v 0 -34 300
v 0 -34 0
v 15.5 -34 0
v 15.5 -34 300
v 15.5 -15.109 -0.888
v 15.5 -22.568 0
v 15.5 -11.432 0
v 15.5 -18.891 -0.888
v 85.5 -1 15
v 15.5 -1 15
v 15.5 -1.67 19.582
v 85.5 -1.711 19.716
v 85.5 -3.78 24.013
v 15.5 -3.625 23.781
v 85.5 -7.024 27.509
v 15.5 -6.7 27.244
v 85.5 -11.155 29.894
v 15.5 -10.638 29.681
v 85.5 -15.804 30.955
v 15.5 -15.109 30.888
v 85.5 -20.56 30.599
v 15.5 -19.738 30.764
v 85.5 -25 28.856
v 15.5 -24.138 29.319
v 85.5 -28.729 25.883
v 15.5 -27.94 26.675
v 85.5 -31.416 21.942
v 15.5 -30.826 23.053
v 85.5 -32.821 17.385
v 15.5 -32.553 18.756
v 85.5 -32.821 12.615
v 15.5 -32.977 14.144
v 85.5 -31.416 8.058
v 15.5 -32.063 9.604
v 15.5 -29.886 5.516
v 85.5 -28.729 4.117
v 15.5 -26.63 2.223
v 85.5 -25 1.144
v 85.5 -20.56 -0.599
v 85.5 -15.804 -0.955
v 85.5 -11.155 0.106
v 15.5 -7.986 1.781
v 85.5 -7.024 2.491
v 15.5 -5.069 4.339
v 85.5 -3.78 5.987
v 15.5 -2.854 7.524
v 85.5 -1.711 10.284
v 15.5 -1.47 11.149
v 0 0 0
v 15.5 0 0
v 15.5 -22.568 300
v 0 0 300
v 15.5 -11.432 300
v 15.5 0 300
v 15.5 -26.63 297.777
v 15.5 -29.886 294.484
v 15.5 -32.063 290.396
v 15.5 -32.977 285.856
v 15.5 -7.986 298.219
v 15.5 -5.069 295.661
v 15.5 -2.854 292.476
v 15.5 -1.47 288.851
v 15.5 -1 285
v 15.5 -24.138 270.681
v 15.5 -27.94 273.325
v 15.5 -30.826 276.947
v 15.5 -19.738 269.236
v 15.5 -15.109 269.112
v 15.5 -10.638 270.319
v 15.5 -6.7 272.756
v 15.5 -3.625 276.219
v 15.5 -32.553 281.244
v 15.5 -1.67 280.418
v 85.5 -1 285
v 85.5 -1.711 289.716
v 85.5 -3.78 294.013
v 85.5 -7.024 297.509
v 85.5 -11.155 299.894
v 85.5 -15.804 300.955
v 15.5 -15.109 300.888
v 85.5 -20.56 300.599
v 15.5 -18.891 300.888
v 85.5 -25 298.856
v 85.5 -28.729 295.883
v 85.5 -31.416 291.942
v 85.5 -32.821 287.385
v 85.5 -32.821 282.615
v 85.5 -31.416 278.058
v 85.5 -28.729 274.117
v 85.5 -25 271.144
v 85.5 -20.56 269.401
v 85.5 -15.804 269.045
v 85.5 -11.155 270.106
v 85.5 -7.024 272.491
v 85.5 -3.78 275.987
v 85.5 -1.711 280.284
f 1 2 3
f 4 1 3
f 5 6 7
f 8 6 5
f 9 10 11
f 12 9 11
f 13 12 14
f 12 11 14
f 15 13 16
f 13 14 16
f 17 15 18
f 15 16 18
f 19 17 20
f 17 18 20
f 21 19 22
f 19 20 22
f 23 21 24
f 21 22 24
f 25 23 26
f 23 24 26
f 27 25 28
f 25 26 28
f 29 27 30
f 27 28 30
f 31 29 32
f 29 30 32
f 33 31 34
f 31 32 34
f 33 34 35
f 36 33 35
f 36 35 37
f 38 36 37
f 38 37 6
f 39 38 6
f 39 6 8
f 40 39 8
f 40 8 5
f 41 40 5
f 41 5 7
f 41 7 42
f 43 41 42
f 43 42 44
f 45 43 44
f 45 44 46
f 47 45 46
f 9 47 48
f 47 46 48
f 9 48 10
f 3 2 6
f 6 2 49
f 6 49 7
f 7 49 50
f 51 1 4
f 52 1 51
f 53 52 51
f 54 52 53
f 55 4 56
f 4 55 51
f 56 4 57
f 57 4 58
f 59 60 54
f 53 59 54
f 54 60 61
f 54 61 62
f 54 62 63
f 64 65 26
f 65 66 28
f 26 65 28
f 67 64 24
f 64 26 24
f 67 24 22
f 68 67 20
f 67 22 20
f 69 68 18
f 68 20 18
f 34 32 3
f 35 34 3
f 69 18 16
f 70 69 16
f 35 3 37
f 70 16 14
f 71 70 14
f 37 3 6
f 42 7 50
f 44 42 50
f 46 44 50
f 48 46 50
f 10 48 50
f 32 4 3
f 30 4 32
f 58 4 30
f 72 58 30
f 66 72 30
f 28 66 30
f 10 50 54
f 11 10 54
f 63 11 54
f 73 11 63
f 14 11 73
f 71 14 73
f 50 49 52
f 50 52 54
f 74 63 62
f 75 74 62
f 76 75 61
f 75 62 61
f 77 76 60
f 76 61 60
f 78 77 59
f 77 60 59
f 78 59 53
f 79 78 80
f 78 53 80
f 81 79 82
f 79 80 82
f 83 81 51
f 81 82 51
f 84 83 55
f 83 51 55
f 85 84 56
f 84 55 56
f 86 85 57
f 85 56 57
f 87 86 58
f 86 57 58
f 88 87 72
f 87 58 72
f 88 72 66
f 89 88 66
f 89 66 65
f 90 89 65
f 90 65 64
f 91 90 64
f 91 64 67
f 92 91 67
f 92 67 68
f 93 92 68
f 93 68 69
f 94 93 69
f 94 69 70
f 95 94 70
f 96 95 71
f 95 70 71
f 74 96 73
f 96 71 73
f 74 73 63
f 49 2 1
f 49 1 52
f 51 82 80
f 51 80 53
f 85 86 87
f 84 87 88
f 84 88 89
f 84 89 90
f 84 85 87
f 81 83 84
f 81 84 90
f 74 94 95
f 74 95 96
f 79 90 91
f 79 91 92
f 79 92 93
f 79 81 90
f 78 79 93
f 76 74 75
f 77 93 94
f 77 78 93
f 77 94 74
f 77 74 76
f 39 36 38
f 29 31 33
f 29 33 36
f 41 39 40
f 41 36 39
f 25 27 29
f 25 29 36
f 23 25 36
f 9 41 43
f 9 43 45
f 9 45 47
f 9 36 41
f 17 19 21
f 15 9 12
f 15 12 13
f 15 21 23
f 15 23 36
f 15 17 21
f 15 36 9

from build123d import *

# Parameters (mm, degrees)
F0_W     = 15.5
F0_H     = 34
F1_DEPTH = 300
F2_R     = 16
F3_DEPTH = 70


with BuildPart() as f1:
    # F0 (on Top) → F1 (new body)
    with BuildSketch(Plane.XY):
        with Locations((7.75, -17)):
            Rectangle(F0_W, F0_H)
    extrude(amount=F1_DEPTH)

    # F2 (on face) → F3 (join)
    with BuildSketch(Plane.YZ.offset(15.5)):
        with Locations((-17, 285)):
            Circle(F2_R)
        with Locations((-17, 15)):
            Circle(F2_R)
    extrude(amount=F3_DEPTH)


solid = f1.part
